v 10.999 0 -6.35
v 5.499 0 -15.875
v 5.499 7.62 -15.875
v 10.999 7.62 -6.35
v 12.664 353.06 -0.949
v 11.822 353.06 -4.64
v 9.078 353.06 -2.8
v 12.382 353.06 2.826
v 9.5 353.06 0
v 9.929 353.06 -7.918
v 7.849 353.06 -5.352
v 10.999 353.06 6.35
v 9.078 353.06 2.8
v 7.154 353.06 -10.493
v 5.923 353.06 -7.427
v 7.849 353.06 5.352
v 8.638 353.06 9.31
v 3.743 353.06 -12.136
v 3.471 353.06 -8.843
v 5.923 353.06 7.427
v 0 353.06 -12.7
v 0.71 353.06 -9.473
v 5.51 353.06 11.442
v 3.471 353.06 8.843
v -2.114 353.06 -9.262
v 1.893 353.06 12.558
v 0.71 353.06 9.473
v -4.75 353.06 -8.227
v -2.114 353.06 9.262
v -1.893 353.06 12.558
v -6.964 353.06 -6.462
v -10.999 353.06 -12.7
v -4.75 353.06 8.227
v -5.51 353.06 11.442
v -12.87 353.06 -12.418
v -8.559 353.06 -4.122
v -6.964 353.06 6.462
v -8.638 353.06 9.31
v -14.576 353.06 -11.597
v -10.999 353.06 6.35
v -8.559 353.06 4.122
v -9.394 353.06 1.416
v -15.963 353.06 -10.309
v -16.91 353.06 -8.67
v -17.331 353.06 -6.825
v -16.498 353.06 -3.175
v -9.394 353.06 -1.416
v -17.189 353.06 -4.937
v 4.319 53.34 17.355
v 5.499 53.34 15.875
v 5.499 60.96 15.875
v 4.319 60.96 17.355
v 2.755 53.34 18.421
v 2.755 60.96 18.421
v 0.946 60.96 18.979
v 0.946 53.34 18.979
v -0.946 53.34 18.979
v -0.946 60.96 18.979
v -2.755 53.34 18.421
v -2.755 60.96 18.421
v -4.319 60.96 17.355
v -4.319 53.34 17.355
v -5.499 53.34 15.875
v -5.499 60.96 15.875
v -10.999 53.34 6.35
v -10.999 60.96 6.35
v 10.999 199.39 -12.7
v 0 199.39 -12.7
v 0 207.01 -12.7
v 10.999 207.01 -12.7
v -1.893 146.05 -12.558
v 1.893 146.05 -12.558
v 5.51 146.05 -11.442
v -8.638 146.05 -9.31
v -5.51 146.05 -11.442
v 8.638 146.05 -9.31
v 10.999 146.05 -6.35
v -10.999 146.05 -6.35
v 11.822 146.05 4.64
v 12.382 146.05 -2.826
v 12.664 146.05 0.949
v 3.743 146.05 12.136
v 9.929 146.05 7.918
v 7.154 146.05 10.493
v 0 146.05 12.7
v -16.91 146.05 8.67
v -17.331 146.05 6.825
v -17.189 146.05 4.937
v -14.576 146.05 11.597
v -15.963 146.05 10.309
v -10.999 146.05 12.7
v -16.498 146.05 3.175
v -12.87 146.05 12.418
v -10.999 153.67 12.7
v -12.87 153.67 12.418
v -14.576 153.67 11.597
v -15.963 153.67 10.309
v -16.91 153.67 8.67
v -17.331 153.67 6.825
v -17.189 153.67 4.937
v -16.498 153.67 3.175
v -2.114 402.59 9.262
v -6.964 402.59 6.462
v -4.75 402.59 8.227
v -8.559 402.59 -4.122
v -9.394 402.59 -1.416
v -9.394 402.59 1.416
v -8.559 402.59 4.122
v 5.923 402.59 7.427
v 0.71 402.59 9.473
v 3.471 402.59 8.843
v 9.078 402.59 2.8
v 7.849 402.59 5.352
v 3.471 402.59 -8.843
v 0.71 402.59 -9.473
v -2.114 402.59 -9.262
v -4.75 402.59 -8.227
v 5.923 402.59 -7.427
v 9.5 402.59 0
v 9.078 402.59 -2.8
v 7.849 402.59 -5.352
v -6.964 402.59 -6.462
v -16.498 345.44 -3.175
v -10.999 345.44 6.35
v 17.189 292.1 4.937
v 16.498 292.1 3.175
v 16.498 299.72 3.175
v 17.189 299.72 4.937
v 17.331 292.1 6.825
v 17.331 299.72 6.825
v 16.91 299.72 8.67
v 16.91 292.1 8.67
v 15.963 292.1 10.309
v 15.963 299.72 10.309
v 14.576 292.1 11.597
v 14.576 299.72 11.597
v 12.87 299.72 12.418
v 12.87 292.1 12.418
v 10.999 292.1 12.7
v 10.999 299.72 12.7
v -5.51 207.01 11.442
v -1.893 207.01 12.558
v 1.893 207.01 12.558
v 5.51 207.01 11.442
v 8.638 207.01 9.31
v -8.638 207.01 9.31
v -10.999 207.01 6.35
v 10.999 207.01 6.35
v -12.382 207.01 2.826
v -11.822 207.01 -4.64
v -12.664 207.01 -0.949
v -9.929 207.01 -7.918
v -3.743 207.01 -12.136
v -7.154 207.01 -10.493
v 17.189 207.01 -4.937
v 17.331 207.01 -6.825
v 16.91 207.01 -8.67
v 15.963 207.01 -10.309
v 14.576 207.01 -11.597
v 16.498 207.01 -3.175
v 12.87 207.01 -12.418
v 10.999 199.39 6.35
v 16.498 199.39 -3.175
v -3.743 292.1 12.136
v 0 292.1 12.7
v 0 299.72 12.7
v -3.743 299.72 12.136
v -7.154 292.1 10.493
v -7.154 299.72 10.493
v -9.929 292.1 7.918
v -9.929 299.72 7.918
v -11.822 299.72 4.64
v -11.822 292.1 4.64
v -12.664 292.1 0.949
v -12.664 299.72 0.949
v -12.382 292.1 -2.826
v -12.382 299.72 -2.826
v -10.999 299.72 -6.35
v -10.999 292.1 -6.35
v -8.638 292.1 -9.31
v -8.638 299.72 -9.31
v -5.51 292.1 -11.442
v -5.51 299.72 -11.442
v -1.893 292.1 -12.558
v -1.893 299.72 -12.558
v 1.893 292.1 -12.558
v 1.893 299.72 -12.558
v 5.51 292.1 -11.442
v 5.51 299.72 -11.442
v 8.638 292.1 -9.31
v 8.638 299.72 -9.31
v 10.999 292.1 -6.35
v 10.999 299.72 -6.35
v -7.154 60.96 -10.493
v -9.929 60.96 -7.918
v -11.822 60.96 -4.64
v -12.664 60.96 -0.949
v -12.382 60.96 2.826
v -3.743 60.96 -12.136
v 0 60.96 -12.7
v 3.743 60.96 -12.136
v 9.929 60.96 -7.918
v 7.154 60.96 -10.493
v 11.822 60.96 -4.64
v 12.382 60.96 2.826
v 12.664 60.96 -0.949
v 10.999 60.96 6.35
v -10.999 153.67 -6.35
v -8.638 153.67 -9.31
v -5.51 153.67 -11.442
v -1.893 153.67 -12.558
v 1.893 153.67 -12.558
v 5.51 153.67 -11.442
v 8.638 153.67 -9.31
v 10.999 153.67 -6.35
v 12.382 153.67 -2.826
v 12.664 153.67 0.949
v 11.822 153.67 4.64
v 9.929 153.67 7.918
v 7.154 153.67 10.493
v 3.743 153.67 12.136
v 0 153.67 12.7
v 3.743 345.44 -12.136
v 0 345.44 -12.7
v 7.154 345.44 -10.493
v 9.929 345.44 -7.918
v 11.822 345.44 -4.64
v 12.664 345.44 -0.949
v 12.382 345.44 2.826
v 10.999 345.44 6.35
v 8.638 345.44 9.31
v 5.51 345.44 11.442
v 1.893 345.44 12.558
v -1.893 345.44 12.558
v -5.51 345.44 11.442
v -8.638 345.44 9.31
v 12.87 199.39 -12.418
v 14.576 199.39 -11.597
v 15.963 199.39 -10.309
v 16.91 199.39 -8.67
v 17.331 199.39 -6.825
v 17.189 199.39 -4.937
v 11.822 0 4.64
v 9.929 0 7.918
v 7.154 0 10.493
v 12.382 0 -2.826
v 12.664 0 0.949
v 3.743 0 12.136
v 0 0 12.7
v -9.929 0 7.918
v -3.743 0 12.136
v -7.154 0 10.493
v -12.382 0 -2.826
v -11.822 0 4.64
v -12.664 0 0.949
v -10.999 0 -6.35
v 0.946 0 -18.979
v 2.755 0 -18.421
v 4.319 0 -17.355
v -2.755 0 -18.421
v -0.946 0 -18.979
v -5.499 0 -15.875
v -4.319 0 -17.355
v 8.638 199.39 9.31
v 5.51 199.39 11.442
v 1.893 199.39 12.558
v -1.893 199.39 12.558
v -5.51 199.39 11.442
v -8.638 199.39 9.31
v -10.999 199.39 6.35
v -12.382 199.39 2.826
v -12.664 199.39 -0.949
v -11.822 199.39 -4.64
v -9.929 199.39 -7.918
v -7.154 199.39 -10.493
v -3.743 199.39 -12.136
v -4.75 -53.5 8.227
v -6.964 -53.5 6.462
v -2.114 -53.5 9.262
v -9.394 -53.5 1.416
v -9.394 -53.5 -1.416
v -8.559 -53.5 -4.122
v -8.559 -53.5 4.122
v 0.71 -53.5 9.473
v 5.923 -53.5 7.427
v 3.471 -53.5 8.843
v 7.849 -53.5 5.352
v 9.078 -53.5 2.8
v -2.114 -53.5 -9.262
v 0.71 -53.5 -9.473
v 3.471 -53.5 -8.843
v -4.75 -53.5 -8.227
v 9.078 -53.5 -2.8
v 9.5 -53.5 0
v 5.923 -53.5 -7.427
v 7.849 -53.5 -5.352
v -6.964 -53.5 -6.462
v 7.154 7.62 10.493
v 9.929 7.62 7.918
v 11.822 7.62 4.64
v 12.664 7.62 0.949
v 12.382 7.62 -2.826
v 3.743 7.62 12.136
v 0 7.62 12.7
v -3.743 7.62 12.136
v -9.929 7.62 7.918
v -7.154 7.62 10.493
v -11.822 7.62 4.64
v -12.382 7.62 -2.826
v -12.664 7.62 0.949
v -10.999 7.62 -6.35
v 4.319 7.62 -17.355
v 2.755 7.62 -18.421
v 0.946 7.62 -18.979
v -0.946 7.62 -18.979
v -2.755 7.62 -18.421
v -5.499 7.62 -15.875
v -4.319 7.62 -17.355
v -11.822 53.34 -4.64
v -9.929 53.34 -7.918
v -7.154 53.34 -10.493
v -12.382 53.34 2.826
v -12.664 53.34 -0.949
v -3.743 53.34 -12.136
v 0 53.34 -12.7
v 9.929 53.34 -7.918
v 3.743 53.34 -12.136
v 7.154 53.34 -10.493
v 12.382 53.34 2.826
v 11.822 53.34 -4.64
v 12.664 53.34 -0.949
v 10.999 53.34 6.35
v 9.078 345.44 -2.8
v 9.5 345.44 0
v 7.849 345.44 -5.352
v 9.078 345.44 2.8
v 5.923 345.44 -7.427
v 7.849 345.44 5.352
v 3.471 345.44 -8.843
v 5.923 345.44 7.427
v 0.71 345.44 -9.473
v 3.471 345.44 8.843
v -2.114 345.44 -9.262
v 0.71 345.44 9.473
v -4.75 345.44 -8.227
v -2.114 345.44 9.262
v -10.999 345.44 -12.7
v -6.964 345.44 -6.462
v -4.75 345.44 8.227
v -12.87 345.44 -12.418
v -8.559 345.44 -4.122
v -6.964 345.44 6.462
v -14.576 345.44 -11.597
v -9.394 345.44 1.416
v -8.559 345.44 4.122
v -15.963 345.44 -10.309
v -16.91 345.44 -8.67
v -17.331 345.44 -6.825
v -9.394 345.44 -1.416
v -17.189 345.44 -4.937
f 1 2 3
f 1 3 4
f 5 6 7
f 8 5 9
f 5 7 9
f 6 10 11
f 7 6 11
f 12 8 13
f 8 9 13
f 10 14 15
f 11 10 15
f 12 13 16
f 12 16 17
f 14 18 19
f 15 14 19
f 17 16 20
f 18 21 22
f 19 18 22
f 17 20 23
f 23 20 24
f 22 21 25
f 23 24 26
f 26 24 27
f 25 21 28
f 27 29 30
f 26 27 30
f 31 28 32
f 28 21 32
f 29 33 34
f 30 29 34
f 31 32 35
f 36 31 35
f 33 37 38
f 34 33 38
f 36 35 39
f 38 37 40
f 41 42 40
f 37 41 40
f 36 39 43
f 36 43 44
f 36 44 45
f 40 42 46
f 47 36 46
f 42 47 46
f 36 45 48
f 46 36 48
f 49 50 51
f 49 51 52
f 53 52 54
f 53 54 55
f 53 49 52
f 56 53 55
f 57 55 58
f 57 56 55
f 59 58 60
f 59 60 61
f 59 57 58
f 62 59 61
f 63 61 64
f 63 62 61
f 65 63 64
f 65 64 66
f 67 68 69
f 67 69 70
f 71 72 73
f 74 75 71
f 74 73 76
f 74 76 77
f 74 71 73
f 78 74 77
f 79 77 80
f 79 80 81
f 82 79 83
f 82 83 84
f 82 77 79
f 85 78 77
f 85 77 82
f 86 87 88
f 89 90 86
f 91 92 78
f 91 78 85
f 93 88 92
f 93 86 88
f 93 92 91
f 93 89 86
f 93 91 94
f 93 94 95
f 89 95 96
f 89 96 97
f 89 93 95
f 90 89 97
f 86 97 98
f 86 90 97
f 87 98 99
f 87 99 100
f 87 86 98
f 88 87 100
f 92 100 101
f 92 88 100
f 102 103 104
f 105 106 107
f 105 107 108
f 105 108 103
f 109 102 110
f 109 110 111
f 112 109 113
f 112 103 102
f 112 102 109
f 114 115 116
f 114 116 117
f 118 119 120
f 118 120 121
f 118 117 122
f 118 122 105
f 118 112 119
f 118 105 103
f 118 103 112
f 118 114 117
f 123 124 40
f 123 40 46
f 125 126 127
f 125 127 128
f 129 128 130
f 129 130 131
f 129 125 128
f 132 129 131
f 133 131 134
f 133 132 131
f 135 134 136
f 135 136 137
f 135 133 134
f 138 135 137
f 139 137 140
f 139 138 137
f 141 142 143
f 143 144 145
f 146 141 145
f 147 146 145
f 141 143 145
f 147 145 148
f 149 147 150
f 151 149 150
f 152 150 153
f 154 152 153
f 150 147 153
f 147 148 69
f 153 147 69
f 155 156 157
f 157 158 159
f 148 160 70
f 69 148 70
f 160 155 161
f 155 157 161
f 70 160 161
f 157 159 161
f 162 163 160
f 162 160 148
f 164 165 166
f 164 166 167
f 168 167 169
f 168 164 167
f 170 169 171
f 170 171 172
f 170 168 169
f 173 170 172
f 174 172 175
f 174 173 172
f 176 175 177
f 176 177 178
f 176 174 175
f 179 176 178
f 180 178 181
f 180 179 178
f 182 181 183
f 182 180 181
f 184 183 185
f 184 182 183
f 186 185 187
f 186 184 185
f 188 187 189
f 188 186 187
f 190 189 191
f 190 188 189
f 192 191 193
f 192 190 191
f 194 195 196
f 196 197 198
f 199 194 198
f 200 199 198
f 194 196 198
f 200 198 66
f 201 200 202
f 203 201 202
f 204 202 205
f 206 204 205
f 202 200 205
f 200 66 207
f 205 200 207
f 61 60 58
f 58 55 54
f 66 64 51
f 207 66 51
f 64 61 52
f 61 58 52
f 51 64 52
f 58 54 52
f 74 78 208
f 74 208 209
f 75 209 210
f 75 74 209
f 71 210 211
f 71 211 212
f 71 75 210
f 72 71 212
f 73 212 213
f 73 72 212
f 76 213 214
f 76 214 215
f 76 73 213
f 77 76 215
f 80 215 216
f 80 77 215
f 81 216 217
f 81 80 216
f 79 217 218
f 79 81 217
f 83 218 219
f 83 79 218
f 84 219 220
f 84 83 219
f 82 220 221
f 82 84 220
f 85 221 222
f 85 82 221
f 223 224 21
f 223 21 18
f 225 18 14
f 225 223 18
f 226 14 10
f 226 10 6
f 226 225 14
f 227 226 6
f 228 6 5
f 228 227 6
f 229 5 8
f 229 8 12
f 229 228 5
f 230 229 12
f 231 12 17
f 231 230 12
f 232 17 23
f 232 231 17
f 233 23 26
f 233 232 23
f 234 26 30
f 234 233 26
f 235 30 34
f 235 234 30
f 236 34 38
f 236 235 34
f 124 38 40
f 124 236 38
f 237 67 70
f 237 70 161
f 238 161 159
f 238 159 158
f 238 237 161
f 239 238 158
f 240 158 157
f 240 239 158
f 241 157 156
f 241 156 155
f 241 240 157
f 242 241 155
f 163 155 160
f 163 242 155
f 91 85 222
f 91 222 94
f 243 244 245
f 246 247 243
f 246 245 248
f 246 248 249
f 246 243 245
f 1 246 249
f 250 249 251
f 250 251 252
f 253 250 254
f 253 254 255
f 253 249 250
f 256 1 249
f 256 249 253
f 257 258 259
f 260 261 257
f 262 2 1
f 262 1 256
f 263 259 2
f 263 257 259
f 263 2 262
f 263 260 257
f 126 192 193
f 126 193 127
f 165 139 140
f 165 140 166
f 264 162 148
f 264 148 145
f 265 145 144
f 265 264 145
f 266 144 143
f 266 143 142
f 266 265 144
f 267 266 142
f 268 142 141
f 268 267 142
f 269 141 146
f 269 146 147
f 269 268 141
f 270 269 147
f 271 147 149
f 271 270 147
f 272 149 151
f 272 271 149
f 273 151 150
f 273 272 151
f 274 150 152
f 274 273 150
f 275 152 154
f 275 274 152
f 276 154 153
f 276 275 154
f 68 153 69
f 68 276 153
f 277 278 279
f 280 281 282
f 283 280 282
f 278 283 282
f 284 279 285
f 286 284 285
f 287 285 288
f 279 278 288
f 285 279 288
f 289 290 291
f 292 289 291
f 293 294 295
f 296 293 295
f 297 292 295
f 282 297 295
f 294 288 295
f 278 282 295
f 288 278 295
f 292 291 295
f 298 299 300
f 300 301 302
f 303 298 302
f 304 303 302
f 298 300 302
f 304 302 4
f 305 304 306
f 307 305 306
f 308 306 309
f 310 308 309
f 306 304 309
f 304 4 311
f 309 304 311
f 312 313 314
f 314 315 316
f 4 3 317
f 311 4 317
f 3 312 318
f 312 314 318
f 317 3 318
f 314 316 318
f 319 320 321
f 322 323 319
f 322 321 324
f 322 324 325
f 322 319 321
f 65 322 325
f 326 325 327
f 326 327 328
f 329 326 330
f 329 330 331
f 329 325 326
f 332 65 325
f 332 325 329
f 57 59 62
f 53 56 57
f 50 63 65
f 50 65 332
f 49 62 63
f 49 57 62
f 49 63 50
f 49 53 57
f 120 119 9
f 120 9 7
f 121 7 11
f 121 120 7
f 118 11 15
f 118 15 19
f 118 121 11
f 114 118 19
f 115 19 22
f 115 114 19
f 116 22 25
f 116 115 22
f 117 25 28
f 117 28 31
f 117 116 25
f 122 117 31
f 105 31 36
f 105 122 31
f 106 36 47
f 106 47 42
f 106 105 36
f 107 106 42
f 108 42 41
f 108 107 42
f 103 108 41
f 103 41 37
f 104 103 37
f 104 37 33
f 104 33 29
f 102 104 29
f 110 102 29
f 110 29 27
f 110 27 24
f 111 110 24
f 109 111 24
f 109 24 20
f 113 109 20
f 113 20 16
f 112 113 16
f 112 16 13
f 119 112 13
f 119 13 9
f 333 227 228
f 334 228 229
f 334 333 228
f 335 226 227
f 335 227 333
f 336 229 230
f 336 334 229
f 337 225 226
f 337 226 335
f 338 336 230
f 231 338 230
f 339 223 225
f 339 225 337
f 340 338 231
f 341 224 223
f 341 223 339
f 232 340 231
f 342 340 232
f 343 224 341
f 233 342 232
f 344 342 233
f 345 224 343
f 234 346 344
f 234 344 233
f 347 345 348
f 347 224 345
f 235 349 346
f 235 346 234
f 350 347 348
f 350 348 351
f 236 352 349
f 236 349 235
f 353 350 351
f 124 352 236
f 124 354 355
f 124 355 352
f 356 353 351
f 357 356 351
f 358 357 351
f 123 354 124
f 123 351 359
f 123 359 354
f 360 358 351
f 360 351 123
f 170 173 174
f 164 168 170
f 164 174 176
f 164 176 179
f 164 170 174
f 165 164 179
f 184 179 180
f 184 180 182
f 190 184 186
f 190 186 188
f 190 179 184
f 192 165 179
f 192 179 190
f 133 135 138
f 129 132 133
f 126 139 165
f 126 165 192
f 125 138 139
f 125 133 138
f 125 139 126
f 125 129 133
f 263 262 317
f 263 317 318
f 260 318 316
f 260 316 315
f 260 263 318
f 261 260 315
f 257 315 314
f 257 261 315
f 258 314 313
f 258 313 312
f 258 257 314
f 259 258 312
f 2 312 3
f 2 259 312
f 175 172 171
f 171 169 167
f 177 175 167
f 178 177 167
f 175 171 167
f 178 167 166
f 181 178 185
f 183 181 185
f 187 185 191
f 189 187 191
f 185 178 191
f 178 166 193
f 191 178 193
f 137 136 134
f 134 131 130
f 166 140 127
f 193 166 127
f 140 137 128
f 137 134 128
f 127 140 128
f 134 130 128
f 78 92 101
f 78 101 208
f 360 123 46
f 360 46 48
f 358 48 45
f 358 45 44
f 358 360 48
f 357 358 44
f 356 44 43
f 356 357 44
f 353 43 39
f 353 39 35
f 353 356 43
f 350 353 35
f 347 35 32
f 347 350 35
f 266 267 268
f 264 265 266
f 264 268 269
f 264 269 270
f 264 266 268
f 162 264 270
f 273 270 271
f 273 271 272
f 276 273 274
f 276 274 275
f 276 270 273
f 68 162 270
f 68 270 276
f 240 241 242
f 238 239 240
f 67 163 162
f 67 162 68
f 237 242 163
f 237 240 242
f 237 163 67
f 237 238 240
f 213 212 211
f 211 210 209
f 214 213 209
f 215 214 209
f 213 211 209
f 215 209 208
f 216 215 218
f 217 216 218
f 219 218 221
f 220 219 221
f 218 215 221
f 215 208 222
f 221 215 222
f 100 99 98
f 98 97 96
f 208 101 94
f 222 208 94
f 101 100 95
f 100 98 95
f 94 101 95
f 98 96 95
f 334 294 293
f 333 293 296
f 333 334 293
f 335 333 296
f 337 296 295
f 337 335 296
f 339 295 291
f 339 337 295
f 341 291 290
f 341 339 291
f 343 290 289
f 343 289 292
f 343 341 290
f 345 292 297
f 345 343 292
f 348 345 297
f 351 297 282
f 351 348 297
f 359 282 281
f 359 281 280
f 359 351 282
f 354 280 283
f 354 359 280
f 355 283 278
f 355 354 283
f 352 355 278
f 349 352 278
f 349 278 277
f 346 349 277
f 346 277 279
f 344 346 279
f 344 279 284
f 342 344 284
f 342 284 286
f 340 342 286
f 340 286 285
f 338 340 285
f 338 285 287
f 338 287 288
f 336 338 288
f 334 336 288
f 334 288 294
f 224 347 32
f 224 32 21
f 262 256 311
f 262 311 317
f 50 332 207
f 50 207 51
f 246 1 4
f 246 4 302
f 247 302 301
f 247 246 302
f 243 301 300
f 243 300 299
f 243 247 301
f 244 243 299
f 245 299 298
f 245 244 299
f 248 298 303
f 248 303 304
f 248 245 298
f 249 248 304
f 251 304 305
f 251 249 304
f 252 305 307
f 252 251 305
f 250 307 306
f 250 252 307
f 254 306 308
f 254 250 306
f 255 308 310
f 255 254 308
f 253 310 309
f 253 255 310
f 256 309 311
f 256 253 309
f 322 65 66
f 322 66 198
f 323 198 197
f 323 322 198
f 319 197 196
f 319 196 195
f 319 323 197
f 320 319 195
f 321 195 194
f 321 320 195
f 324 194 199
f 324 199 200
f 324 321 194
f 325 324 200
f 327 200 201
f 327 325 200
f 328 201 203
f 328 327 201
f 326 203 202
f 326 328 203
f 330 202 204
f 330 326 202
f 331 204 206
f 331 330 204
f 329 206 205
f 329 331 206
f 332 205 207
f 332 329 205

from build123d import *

# Parameters (mm, degrees)
BOSS_EXTRUDE1_DEPTH   = 7.62
LPATTERN3_COUNT       = 2
LPATTERN3_PITCH       = 53.34
BODY_MOVE_COPY1_ANGLE = 180
LPATTERN5_COUNT       = 3
LPATTERN5_PITCH       = 146.05
BODY_MOVE_COPY2_ANGLE = 120
BODY_MOVE_COPY3_ANGLE = 120
BOSS_EXTRUDE2_START   = 49.53
SKETCH3_R             = 9.5
BOSS_EXTRUDE2_DEPTH   = 456.09


with BuildPart() as part:
    # Sketch2 → Boss-Extrude1 (new body)
    with BuildSketch(Plane(origin=(0, 0, 0), x_dir=(1, 0, 0), z_dir=(0, 1, 0))):
        with BuildLine():
            Line((-10.998522628, 6.35), (-5.499261314, 15.875))
            ThreePointArc((-5.499261314, 15.875), (0, 19.05), (5.499261314, 15.875))
            Line((5.499261314, 15.875), (10.998522628, 6.35))
            ThreePointArc((10.998522628, 6.35), (0, -12.7), (-10.998522628, 6.35))
        make_face()
    extrude(amount=BOSS_EXTRUDE1_DEPTH)


with BuildPart() as lpattern3_1:
    # LPattern3: pattern copy
    add(part.part.moved(Location(Vector(0, 1, 0) * (1 * LPATTERN3_PITCH))))


with BuildPart() as lpattern3_1_1:
    # Body-Move/Copy1: moved
    add(lpattern3_1.part.rotate(Axis((0, 0, 0), (0, 1, 0)), BODY_MOVE_COPY1_ANGLE))


with BuildPart() as lpattern5_1:
    # LPattern5: pattern copy
    add(lpattern3_1_1.part.moved(Location(Vector(0, 1, 0) * (1 * LPATTERN5_PITCH))))


with BuildPart() as lpattern5_2:
    # LPattern5: pattern copy
    add(lpattern3_1_1.part.moved(Location(Vector(0, 1, 0) * (2 * LPATTERN5_PITCH))))


with BuildPart() as lpattern5_3:
    # LPattern5: pattern copy
    add(part.part.moved(Location(Vector(0, 1, 0) * (1 * LPATTERN5_PITCH))))


with BuildPart() as lpattern5_4:
    # LPattern5: pattern copy
    add(part.part.moved(Location(Vector(0, 1, 0) * (2 * LPATTERN5_PITCH))))


with BuildPart() as lpattern5_3_1:
    # Body-Move/Copy2: moved
    add(lpattern5_3.part.rotate(Axis((0, 0, 0), (0, 1, 0)), BODY_MOVE_COPY2_ANGLE))


with BuildPart() as lpattern5_1_1:
    # Body-Move/Copy2: moved
    add(lpattern5_1.part.rotate(Axis((0, 0, 0), (0, 1, 0)), BODY_MOVE_COPY2_ANGLE))


with BuildPart() as lpattern5_4_1:
    # Body-Move/Copy3: moved
    add(lpattern5_4.part.rotate(Axis((0, 0, 0), (0, -1, 0)), BODY_MOVE_COPY3_ANGLE))


with BuildPart() as lpattern5_2_1:
    # Body-Move/Copy3: moved
    add(lpattern5_2.part.rotate(Axis((0, 0, 0), (0, -1, 0)), BODY_MOVE_COPY3_ANGLE))

    # Sketch3 → Boss-Extrude2 (add)
    with BuildSketch(Plane(origin=(0, 353.06, 0), x_dir=(1, 0, 0), z_dir=(0, 1, 0)).offset(BOSS_EXTRUDE2_START)):
        Circle(SKETCH3_R)
    extrude(amount=-BOSS_EXTRUDE2_DEPTH)


solid = Compound([part.part, lpattern3_1_1.part, lpattern5_3_1.part, lpattern5_1_1.part, lpattern5_4_1.part, lpattern5_2_1.part])
